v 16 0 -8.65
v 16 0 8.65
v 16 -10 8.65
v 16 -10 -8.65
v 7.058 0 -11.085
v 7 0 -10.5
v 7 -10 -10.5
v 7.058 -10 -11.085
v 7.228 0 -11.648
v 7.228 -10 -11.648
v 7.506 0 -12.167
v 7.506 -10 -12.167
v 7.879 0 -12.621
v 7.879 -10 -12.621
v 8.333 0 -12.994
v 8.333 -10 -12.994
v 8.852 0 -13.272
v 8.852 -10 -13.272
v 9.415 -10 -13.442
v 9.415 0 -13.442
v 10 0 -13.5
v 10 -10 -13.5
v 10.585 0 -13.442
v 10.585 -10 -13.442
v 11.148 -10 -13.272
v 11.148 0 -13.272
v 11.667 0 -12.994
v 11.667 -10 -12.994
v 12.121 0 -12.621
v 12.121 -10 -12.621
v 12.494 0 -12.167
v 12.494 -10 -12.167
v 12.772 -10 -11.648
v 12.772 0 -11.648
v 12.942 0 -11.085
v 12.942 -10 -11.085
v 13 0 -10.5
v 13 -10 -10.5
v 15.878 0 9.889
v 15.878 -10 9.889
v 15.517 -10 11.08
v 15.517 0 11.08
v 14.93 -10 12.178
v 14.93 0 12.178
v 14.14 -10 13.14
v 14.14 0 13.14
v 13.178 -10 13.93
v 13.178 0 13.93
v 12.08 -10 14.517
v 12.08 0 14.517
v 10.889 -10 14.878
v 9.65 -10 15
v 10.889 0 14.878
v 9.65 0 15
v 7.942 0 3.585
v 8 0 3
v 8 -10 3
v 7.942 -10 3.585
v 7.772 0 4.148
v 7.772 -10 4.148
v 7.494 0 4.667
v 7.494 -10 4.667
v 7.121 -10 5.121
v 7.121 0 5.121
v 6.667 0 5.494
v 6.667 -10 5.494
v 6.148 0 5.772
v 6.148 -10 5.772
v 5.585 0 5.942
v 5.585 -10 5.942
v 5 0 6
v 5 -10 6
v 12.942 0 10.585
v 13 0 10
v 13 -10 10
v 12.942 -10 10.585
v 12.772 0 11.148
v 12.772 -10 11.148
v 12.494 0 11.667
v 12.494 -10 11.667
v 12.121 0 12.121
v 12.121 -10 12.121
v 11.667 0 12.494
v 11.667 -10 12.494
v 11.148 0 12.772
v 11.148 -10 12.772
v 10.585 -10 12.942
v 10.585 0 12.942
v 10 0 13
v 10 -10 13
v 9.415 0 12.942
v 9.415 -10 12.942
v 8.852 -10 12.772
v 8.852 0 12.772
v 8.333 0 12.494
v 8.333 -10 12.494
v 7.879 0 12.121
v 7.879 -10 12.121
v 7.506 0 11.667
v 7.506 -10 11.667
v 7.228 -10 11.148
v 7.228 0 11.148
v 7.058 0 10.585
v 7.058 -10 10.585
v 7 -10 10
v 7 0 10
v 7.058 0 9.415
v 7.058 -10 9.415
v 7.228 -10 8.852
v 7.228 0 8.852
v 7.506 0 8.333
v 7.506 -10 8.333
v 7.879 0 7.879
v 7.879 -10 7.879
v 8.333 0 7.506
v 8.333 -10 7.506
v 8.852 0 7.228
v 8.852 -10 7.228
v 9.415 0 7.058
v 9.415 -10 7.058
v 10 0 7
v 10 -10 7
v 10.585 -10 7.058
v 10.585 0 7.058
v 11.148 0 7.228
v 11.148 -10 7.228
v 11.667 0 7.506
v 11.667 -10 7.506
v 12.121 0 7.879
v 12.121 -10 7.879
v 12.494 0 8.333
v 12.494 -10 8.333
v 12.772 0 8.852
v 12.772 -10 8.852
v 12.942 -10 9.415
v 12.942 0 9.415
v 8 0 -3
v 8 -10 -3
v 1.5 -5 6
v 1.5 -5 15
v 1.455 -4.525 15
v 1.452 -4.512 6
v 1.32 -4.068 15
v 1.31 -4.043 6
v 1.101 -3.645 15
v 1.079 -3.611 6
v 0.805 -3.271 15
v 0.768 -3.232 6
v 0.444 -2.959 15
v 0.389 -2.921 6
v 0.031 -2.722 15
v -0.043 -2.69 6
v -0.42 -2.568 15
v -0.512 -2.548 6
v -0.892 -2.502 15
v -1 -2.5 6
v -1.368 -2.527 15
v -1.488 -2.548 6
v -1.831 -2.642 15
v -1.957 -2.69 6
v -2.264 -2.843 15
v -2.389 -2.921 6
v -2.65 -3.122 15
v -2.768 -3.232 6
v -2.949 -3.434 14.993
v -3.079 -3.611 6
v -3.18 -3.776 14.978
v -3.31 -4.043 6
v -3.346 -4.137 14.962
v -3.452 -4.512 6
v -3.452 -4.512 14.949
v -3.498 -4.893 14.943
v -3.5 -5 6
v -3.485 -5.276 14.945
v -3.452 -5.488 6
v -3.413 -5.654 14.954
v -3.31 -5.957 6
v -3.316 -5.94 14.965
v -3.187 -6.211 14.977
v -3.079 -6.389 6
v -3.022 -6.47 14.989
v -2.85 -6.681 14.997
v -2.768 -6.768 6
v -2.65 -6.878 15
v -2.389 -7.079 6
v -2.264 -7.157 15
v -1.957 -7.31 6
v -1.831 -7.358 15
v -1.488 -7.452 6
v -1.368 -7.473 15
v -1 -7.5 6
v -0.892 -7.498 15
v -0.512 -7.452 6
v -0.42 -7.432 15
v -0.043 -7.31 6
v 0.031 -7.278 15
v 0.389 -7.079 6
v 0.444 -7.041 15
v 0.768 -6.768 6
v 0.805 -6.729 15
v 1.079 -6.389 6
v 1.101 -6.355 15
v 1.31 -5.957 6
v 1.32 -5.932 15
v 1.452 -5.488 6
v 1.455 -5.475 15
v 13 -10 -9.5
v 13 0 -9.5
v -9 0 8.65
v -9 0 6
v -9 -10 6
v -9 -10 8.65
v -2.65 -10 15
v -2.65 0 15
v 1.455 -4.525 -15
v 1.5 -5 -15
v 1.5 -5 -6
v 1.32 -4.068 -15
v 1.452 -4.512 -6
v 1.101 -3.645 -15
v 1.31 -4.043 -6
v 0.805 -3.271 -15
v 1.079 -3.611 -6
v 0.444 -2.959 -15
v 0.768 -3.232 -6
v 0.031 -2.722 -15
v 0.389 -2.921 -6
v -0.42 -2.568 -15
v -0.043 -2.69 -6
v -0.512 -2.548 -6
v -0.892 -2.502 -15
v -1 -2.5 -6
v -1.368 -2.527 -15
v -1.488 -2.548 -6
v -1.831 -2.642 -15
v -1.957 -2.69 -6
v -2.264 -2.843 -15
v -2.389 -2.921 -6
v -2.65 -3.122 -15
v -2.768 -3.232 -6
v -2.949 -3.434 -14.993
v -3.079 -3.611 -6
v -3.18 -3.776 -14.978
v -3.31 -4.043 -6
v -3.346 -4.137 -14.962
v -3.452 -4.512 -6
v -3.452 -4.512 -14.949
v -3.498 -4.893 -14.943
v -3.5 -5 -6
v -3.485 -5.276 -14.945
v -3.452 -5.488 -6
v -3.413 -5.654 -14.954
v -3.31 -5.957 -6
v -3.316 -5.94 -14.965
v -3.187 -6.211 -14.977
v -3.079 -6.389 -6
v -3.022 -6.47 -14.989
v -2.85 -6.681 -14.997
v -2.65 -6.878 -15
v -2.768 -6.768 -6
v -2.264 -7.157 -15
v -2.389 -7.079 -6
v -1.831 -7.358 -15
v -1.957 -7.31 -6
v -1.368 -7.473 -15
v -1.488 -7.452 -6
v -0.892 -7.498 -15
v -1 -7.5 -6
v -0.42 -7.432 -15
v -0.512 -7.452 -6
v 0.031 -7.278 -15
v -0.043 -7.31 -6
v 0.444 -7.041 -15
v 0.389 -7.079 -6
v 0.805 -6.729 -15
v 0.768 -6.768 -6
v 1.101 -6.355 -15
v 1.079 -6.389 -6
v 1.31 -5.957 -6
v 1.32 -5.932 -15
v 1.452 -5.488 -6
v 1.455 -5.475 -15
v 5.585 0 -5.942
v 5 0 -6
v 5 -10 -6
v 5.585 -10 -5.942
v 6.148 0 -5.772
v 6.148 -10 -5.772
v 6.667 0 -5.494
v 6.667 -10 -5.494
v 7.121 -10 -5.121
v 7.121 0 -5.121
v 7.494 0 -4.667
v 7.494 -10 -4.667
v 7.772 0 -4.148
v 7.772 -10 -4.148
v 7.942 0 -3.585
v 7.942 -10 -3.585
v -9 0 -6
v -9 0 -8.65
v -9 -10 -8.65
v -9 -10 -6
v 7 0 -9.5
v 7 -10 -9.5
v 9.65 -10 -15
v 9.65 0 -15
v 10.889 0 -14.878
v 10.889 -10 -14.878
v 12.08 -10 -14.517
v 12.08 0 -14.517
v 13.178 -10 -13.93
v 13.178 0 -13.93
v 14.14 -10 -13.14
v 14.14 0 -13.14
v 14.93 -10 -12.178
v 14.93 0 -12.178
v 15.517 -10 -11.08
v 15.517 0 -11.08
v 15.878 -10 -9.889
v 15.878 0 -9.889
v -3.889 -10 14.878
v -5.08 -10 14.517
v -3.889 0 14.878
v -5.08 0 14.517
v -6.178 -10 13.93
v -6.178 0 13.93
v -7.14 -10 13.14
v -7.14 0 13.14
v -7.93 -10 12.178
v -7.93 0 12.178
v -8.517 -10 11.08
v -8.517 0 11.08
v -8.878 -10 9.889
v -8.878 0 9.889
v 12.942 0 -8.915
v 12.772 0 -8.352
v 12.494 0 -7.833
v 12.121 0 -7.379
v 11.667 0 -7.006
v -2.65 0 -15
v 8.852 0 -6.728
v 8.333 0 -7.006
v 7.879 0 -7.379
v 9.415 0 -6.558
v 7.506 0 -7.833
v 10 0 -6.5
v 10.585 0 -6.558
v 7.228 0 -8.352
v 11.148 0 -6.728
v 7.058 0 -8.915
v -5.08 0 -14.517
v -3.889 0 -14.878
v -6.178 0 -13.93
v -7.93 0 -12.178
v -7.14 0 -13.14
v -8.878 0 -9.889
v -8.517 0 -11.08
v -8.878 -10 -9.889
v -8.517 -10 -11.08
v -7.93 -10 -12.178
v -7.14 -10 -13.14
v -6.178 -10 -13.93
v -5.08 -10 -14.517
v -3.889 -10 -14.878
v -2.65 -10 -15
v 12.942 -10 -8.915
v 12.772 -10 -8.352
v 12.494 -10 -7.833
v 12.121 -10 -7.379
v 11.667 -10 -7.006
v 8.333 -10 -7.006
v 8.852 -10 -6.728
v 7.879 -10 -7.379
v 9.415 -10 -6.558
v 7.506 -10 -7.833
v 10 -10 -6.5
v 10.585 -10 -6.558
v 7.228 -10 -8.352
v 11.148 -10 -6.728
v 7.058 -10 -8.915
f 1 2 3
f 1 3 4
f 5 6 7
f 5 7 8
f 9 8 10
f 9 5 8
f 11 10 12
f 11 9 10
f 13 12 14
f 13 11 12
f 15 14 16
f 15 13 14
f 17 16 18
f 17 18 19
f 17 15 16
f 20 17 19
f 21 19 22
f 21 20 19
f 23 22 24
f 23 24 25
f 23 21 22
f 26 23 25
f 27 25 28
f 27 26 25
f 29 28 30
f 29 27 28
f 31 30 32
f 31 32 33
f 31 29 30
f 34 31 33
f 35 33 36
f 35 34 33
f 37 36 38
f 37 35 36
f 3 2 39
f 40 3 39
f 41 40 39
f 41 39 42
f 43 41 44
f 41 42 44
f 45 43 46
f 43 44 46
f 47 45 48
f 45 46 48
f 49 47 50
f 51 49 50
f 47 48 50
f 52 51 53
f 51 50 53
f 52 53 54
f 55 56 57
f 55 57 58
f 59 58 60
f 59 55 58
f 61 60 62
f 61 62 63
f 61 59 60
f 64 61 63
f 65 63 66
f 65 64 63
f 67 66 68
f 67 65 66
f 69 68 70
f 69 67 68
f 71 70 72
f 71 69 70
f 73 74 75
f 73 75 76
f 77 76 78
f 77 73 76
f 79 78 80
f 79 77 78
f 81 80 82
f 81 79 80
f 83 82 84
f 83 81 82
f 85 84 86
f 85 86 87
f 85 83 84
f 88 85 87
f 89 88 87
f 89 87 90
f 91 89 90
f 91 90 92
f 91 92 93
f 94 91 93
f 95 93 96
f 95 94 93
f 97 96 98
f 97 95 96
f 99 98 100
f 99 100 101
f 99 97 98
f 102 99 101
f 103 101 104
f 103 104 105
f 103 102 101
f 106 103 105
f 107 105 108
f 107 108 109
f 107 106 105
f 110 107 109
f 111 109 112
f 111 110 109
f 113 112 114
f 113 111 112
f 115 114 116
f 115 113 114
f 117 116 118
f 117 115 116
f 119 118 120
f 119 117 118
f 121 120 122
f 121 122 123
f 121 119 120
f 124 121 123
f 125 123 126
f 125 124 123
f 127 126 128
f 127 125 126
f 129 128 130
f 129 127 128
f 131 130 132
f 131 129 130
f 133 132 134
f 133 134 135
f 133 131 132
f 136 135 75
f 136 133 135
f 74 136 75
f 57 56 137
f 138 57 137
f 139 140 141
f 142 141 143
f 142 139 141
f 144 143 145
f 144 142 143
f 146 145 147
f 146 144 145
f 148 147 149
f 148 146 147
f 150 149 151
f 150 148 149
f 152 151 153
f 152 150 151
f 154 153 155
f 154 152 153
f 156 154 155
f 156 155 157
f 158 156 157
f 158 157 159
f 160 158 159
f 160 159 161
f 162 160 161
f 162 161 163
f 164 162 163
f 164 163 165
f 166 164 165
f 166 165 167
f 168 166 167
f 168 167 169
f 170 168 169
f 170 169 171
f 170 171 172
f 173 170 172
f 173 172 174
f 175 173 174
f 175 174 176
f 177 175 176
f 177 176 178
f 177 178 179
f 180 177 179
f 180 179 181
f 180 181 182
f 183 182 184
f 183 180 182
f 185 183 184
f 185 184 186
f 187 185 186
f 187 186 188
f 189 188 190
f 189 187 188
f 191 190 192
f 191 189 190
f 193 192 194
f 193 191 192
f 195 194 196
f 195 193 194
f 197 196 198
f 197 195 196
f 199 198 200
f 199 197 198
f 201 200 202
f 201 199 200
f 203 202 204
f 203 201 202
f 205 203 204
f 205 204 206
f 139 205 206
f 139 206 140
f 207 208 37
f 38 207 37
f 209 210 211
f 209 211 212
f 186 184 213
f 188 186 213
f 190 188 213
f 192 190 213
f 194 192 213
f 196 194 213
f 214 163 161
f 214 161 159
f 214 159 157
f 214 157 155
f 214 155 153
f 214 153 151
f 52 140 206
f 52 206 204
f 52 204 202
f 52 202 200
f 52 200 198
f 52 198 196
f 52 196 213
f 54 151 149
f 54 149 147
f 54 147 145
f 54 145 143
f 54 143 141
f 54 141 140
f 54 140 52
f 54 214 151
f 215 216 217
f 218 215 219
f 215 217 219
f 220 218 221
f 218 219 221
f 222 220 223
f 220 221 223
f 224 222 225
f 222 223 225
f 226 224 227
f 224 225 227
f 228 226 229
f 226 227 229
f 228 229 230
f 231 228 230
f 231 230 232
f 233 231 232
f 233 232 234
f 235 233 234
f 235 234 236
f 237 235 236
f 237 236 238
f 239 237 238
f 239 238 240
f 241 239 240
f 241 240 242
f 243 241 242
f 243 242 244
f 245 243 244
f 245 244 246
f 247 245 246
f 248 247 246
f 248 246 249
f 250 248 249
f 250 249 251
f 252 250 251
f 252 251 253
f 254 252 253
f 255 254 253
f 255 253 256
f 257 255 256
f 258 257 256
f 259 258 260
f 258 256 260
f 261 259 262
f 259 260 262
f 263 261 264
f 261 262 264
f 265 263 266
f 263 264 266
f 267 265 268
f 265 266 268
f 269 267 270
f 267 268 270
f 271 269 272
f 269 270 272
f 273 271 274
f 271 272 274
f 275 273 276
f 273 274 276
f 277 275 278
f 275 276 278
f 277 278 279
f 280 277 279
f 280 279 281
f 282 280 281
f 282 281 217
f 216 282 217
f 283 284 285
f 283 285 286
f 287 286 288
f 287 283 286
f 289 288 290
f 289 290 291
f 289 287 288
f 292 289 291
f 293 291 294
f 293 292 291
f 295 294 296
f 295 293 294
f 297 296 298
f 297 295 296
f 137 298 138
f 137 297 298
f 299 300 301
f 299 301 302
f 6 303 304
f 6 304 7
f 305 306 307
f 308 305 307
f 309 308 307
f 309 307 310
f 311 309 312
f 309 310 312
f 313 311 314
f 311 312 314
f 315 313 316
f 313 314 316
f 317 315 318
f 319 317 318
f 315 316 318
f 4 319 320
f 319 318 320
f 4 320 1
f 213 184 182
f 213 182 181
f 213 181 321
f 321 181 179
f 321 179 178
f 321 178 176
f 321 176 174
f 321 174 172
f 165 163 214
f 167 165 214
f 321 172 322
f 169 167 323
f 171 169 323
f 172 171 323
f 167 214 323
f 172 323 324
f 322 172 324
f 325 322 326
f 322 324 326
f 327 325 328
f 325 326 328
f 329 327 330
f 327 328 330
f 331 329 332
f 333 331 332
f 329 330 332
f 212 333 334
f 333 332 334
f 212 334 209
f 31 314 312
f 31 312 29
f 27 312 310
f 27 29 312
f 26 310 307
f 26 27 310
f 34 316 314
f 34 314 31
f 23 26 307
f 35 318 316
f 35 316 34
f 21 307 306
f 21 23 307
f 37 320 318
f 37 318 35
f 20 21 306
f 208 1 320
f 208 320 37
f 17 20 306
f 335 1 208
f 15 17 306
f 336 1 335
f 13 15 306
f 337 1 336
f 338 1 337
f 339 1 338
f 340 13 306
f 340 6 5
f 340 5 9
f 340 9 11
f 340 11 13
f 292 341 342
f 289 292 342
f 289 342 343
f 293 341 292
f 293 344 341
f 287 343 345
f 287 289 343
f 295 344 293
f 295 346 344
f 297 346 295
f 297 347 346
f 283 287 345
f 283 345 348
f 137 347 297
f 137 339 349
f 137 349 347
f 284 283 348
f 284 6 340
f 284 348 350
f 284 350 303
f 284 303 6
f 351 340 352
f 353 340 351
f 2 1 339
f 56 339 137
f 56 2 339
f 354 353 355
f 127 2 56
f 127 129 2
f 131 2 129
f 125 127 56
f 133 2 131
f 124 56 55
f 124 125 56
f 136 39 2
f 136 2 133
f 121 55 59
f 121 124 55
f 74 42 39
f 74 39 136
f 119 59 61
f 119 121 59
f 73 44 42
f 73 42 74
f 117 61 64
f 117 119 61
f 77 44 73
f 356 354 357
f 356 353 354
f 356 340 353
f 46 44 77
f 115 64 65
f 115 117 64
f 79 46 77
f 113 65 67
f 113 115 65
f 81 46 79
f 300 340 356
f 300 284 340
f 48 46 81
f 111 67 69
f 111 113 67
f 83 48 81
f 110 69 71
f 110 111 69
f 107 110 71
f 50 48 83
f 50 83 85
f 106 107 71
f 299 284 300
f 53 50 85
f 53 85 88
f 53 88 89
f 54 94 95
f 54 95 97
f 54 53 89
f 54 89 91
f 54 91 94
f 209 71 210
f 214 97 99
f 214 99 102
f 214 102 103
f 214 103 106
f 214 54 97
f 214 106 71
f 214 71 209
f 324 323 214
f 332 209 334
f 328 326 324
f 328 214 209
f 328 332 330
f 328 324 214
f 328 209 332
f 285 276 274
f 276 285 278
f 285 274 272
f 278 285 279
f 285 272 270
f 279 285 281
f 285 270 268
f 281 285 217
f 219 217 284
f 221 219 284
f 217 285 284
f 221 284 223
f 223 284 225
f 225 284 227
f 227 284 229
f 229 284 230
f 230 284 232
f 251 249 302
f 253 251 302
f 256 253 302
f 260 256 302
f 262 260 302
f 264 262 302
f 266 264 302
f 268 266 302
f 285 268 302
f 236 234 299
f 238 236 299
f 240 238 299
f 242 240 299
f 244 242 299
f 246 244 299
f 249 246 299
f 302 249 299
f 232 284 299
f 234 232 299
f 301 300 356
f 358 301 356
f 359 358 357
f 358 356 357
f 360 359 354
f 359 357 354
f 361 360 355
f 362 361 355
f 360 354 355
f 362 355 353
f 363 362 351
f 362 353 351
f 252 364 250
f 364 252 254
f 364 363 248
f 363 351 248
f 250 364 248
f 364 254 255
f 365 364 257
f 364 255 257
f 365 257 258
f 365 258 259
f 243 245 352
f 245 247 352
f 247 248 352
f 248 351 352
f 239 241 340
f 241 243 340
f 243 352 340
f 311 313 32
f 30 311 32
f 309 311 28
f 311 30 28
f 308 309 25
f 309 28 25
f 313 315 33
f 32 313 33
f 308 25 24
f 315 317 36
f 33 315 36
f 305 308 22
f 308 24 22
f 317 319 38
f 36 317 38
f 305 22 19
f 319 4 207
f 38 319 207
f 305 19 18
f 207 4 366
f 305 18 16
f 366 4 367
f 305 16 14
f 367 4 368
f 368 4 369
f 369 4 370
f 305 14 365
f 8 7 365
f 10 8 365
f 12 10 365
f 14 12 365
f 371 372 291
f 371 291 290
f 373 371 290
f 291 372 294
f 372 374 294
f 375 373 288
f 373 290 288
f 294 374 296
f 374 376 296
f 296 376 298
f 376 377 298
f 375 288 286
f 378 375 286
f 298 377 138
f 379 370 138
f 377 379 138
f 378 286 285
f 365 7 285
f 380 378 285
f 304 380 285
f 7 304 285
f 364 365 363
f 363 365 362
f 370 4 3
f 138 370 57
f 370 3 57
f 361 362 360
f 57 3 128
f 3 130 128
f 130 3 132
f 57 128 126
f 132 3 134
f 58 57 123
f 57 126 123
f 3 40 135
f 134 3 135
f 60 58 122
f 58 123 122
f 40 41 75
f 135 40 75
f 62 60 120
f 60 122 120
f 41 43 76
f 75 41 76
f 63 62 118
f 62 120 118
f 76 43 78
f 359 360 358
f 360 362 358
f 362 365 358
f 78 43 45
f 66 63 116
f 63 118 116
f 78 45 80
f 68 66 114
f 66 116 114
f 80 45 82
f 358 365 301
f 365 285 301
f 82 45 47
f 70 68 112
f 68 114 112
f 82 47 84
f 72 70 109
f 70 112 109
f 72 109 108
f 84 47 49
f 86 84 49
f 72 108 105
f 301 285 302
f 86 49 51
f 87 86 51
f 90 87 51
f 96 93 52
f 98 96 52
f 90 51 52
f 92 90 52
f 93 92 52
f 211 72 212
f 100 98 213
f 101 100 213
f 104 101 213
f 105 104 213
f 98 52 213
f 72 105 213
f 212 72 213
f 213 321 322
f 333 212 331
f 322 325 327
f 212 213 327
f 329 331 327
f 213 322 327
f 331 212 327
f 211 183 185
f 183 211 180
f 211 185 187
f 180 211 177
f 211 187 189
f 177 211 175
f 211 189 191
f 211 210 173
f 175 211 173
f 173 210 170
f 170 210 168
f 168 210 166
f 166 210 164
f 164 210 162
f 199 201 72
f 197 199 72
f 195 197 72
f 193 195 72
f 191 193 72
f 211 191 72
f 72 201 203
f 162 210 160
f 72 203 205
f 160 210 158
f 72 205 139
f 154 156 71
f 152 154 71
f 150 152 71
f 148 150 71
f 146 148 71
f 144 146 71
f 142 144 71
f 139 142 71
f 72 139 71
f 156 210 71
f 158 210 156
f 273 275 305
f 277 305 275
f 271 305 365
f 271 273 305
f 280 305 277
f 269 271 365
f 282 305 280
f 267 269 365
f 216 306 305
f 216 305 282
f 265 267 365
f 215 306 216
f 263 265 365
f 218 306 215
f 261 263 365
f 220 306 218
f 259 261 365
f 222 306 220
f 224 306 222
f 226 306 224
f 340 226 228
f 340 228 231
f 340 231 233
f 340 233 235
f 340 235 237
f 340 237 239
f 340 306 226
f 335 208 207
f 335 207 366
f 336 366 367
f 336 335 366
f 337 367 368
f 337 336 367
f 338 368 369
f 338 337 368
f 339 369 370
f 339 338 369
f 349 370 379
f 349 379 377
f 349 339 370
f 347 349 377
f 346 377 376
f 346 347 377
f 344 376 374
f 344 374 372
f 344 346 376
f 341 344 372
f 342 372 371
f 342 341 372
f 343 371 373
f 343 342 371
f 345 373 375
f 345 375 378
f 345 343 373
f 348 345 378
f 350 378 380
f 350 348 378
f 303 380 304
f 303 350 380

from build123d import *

# Parameters (mm, degrees)
SKETCH091_R          = 3
PAD031_DEPTH         = 10
SKETCH092_R          = 2.5
POCKET026_DEPTH      = 15.001
POCKET026_DEPTH_BACK = -15.001


with BuildPart() as part:
    # Sketch091 → Pad031 (new body)
    with BuildSketch(Plane.XZ):
        with BuildLine():
            Line((-2.65, 15), (9.65, 15))
            ThreePointArc((16, 8.65), (14.140128, 13.140128), (9.65, 15))
            Line((16, 8.65), (16, -8.65))
            ThreePointArc((9.65, -15), (14.140128, -13.140128), (16, -8.65))
            Line((9.65, -15), (-2.65, -15))
            ThreePointArc((-9, -8.65), (-7.140128, -13.140128), (-2.65, -15))
            Line((-9, -8.65), (-9, -6))
            Line((5, -6), (-9, -6))
            ThreePointArc((5, -6), (7.12132, -5.12132), (8, -3))
            Line((8, 3), (8, -3))
            ThreePointArc((8, 3), (7.12132, 5.12132), (5, 6))
            Line((-9, 6), (5, 6))
            Line((-9, 6), (-9, 8.65))
            ThreePointArc((-2.65, 15), (-7.140128, 13.140128), (-9, 8.65))
        make_face()
        with Locations((10, 10)):
            Circle(SKETCH091_R, mode=Mode.SUBTRACT)
        with BuildLine():
            ThreePointArc((13, -9.5), (10, -6.5), (7, -9.5))
            Line((7, -9.5), (7, -10.5))
            ThreePointArc((7, -10.5), (10, -13.5), (13, -10.5))
            Line((13, -9.5), (13, -10.5))
        make_face(mode=Mode.SUBTRACT)
    extrude(amount=PAD031_DEPTH)

    # Sketch092 → Pocket026 (cut, two sides)
    with BuildSketch(Plane.XY) as pocket026_sk:
        with Locations((-1, -5)):
            Circle(SKETCH092_R)
    extrude(amount=-POCKET026_DEPTH, mode=Mode.SUBTRACT)
    extrude(pocket026_sk.sketch, amount=-POCKET026_DEPTH_BACK, mode=Mode.SUBTRACT)


solid = part.part
